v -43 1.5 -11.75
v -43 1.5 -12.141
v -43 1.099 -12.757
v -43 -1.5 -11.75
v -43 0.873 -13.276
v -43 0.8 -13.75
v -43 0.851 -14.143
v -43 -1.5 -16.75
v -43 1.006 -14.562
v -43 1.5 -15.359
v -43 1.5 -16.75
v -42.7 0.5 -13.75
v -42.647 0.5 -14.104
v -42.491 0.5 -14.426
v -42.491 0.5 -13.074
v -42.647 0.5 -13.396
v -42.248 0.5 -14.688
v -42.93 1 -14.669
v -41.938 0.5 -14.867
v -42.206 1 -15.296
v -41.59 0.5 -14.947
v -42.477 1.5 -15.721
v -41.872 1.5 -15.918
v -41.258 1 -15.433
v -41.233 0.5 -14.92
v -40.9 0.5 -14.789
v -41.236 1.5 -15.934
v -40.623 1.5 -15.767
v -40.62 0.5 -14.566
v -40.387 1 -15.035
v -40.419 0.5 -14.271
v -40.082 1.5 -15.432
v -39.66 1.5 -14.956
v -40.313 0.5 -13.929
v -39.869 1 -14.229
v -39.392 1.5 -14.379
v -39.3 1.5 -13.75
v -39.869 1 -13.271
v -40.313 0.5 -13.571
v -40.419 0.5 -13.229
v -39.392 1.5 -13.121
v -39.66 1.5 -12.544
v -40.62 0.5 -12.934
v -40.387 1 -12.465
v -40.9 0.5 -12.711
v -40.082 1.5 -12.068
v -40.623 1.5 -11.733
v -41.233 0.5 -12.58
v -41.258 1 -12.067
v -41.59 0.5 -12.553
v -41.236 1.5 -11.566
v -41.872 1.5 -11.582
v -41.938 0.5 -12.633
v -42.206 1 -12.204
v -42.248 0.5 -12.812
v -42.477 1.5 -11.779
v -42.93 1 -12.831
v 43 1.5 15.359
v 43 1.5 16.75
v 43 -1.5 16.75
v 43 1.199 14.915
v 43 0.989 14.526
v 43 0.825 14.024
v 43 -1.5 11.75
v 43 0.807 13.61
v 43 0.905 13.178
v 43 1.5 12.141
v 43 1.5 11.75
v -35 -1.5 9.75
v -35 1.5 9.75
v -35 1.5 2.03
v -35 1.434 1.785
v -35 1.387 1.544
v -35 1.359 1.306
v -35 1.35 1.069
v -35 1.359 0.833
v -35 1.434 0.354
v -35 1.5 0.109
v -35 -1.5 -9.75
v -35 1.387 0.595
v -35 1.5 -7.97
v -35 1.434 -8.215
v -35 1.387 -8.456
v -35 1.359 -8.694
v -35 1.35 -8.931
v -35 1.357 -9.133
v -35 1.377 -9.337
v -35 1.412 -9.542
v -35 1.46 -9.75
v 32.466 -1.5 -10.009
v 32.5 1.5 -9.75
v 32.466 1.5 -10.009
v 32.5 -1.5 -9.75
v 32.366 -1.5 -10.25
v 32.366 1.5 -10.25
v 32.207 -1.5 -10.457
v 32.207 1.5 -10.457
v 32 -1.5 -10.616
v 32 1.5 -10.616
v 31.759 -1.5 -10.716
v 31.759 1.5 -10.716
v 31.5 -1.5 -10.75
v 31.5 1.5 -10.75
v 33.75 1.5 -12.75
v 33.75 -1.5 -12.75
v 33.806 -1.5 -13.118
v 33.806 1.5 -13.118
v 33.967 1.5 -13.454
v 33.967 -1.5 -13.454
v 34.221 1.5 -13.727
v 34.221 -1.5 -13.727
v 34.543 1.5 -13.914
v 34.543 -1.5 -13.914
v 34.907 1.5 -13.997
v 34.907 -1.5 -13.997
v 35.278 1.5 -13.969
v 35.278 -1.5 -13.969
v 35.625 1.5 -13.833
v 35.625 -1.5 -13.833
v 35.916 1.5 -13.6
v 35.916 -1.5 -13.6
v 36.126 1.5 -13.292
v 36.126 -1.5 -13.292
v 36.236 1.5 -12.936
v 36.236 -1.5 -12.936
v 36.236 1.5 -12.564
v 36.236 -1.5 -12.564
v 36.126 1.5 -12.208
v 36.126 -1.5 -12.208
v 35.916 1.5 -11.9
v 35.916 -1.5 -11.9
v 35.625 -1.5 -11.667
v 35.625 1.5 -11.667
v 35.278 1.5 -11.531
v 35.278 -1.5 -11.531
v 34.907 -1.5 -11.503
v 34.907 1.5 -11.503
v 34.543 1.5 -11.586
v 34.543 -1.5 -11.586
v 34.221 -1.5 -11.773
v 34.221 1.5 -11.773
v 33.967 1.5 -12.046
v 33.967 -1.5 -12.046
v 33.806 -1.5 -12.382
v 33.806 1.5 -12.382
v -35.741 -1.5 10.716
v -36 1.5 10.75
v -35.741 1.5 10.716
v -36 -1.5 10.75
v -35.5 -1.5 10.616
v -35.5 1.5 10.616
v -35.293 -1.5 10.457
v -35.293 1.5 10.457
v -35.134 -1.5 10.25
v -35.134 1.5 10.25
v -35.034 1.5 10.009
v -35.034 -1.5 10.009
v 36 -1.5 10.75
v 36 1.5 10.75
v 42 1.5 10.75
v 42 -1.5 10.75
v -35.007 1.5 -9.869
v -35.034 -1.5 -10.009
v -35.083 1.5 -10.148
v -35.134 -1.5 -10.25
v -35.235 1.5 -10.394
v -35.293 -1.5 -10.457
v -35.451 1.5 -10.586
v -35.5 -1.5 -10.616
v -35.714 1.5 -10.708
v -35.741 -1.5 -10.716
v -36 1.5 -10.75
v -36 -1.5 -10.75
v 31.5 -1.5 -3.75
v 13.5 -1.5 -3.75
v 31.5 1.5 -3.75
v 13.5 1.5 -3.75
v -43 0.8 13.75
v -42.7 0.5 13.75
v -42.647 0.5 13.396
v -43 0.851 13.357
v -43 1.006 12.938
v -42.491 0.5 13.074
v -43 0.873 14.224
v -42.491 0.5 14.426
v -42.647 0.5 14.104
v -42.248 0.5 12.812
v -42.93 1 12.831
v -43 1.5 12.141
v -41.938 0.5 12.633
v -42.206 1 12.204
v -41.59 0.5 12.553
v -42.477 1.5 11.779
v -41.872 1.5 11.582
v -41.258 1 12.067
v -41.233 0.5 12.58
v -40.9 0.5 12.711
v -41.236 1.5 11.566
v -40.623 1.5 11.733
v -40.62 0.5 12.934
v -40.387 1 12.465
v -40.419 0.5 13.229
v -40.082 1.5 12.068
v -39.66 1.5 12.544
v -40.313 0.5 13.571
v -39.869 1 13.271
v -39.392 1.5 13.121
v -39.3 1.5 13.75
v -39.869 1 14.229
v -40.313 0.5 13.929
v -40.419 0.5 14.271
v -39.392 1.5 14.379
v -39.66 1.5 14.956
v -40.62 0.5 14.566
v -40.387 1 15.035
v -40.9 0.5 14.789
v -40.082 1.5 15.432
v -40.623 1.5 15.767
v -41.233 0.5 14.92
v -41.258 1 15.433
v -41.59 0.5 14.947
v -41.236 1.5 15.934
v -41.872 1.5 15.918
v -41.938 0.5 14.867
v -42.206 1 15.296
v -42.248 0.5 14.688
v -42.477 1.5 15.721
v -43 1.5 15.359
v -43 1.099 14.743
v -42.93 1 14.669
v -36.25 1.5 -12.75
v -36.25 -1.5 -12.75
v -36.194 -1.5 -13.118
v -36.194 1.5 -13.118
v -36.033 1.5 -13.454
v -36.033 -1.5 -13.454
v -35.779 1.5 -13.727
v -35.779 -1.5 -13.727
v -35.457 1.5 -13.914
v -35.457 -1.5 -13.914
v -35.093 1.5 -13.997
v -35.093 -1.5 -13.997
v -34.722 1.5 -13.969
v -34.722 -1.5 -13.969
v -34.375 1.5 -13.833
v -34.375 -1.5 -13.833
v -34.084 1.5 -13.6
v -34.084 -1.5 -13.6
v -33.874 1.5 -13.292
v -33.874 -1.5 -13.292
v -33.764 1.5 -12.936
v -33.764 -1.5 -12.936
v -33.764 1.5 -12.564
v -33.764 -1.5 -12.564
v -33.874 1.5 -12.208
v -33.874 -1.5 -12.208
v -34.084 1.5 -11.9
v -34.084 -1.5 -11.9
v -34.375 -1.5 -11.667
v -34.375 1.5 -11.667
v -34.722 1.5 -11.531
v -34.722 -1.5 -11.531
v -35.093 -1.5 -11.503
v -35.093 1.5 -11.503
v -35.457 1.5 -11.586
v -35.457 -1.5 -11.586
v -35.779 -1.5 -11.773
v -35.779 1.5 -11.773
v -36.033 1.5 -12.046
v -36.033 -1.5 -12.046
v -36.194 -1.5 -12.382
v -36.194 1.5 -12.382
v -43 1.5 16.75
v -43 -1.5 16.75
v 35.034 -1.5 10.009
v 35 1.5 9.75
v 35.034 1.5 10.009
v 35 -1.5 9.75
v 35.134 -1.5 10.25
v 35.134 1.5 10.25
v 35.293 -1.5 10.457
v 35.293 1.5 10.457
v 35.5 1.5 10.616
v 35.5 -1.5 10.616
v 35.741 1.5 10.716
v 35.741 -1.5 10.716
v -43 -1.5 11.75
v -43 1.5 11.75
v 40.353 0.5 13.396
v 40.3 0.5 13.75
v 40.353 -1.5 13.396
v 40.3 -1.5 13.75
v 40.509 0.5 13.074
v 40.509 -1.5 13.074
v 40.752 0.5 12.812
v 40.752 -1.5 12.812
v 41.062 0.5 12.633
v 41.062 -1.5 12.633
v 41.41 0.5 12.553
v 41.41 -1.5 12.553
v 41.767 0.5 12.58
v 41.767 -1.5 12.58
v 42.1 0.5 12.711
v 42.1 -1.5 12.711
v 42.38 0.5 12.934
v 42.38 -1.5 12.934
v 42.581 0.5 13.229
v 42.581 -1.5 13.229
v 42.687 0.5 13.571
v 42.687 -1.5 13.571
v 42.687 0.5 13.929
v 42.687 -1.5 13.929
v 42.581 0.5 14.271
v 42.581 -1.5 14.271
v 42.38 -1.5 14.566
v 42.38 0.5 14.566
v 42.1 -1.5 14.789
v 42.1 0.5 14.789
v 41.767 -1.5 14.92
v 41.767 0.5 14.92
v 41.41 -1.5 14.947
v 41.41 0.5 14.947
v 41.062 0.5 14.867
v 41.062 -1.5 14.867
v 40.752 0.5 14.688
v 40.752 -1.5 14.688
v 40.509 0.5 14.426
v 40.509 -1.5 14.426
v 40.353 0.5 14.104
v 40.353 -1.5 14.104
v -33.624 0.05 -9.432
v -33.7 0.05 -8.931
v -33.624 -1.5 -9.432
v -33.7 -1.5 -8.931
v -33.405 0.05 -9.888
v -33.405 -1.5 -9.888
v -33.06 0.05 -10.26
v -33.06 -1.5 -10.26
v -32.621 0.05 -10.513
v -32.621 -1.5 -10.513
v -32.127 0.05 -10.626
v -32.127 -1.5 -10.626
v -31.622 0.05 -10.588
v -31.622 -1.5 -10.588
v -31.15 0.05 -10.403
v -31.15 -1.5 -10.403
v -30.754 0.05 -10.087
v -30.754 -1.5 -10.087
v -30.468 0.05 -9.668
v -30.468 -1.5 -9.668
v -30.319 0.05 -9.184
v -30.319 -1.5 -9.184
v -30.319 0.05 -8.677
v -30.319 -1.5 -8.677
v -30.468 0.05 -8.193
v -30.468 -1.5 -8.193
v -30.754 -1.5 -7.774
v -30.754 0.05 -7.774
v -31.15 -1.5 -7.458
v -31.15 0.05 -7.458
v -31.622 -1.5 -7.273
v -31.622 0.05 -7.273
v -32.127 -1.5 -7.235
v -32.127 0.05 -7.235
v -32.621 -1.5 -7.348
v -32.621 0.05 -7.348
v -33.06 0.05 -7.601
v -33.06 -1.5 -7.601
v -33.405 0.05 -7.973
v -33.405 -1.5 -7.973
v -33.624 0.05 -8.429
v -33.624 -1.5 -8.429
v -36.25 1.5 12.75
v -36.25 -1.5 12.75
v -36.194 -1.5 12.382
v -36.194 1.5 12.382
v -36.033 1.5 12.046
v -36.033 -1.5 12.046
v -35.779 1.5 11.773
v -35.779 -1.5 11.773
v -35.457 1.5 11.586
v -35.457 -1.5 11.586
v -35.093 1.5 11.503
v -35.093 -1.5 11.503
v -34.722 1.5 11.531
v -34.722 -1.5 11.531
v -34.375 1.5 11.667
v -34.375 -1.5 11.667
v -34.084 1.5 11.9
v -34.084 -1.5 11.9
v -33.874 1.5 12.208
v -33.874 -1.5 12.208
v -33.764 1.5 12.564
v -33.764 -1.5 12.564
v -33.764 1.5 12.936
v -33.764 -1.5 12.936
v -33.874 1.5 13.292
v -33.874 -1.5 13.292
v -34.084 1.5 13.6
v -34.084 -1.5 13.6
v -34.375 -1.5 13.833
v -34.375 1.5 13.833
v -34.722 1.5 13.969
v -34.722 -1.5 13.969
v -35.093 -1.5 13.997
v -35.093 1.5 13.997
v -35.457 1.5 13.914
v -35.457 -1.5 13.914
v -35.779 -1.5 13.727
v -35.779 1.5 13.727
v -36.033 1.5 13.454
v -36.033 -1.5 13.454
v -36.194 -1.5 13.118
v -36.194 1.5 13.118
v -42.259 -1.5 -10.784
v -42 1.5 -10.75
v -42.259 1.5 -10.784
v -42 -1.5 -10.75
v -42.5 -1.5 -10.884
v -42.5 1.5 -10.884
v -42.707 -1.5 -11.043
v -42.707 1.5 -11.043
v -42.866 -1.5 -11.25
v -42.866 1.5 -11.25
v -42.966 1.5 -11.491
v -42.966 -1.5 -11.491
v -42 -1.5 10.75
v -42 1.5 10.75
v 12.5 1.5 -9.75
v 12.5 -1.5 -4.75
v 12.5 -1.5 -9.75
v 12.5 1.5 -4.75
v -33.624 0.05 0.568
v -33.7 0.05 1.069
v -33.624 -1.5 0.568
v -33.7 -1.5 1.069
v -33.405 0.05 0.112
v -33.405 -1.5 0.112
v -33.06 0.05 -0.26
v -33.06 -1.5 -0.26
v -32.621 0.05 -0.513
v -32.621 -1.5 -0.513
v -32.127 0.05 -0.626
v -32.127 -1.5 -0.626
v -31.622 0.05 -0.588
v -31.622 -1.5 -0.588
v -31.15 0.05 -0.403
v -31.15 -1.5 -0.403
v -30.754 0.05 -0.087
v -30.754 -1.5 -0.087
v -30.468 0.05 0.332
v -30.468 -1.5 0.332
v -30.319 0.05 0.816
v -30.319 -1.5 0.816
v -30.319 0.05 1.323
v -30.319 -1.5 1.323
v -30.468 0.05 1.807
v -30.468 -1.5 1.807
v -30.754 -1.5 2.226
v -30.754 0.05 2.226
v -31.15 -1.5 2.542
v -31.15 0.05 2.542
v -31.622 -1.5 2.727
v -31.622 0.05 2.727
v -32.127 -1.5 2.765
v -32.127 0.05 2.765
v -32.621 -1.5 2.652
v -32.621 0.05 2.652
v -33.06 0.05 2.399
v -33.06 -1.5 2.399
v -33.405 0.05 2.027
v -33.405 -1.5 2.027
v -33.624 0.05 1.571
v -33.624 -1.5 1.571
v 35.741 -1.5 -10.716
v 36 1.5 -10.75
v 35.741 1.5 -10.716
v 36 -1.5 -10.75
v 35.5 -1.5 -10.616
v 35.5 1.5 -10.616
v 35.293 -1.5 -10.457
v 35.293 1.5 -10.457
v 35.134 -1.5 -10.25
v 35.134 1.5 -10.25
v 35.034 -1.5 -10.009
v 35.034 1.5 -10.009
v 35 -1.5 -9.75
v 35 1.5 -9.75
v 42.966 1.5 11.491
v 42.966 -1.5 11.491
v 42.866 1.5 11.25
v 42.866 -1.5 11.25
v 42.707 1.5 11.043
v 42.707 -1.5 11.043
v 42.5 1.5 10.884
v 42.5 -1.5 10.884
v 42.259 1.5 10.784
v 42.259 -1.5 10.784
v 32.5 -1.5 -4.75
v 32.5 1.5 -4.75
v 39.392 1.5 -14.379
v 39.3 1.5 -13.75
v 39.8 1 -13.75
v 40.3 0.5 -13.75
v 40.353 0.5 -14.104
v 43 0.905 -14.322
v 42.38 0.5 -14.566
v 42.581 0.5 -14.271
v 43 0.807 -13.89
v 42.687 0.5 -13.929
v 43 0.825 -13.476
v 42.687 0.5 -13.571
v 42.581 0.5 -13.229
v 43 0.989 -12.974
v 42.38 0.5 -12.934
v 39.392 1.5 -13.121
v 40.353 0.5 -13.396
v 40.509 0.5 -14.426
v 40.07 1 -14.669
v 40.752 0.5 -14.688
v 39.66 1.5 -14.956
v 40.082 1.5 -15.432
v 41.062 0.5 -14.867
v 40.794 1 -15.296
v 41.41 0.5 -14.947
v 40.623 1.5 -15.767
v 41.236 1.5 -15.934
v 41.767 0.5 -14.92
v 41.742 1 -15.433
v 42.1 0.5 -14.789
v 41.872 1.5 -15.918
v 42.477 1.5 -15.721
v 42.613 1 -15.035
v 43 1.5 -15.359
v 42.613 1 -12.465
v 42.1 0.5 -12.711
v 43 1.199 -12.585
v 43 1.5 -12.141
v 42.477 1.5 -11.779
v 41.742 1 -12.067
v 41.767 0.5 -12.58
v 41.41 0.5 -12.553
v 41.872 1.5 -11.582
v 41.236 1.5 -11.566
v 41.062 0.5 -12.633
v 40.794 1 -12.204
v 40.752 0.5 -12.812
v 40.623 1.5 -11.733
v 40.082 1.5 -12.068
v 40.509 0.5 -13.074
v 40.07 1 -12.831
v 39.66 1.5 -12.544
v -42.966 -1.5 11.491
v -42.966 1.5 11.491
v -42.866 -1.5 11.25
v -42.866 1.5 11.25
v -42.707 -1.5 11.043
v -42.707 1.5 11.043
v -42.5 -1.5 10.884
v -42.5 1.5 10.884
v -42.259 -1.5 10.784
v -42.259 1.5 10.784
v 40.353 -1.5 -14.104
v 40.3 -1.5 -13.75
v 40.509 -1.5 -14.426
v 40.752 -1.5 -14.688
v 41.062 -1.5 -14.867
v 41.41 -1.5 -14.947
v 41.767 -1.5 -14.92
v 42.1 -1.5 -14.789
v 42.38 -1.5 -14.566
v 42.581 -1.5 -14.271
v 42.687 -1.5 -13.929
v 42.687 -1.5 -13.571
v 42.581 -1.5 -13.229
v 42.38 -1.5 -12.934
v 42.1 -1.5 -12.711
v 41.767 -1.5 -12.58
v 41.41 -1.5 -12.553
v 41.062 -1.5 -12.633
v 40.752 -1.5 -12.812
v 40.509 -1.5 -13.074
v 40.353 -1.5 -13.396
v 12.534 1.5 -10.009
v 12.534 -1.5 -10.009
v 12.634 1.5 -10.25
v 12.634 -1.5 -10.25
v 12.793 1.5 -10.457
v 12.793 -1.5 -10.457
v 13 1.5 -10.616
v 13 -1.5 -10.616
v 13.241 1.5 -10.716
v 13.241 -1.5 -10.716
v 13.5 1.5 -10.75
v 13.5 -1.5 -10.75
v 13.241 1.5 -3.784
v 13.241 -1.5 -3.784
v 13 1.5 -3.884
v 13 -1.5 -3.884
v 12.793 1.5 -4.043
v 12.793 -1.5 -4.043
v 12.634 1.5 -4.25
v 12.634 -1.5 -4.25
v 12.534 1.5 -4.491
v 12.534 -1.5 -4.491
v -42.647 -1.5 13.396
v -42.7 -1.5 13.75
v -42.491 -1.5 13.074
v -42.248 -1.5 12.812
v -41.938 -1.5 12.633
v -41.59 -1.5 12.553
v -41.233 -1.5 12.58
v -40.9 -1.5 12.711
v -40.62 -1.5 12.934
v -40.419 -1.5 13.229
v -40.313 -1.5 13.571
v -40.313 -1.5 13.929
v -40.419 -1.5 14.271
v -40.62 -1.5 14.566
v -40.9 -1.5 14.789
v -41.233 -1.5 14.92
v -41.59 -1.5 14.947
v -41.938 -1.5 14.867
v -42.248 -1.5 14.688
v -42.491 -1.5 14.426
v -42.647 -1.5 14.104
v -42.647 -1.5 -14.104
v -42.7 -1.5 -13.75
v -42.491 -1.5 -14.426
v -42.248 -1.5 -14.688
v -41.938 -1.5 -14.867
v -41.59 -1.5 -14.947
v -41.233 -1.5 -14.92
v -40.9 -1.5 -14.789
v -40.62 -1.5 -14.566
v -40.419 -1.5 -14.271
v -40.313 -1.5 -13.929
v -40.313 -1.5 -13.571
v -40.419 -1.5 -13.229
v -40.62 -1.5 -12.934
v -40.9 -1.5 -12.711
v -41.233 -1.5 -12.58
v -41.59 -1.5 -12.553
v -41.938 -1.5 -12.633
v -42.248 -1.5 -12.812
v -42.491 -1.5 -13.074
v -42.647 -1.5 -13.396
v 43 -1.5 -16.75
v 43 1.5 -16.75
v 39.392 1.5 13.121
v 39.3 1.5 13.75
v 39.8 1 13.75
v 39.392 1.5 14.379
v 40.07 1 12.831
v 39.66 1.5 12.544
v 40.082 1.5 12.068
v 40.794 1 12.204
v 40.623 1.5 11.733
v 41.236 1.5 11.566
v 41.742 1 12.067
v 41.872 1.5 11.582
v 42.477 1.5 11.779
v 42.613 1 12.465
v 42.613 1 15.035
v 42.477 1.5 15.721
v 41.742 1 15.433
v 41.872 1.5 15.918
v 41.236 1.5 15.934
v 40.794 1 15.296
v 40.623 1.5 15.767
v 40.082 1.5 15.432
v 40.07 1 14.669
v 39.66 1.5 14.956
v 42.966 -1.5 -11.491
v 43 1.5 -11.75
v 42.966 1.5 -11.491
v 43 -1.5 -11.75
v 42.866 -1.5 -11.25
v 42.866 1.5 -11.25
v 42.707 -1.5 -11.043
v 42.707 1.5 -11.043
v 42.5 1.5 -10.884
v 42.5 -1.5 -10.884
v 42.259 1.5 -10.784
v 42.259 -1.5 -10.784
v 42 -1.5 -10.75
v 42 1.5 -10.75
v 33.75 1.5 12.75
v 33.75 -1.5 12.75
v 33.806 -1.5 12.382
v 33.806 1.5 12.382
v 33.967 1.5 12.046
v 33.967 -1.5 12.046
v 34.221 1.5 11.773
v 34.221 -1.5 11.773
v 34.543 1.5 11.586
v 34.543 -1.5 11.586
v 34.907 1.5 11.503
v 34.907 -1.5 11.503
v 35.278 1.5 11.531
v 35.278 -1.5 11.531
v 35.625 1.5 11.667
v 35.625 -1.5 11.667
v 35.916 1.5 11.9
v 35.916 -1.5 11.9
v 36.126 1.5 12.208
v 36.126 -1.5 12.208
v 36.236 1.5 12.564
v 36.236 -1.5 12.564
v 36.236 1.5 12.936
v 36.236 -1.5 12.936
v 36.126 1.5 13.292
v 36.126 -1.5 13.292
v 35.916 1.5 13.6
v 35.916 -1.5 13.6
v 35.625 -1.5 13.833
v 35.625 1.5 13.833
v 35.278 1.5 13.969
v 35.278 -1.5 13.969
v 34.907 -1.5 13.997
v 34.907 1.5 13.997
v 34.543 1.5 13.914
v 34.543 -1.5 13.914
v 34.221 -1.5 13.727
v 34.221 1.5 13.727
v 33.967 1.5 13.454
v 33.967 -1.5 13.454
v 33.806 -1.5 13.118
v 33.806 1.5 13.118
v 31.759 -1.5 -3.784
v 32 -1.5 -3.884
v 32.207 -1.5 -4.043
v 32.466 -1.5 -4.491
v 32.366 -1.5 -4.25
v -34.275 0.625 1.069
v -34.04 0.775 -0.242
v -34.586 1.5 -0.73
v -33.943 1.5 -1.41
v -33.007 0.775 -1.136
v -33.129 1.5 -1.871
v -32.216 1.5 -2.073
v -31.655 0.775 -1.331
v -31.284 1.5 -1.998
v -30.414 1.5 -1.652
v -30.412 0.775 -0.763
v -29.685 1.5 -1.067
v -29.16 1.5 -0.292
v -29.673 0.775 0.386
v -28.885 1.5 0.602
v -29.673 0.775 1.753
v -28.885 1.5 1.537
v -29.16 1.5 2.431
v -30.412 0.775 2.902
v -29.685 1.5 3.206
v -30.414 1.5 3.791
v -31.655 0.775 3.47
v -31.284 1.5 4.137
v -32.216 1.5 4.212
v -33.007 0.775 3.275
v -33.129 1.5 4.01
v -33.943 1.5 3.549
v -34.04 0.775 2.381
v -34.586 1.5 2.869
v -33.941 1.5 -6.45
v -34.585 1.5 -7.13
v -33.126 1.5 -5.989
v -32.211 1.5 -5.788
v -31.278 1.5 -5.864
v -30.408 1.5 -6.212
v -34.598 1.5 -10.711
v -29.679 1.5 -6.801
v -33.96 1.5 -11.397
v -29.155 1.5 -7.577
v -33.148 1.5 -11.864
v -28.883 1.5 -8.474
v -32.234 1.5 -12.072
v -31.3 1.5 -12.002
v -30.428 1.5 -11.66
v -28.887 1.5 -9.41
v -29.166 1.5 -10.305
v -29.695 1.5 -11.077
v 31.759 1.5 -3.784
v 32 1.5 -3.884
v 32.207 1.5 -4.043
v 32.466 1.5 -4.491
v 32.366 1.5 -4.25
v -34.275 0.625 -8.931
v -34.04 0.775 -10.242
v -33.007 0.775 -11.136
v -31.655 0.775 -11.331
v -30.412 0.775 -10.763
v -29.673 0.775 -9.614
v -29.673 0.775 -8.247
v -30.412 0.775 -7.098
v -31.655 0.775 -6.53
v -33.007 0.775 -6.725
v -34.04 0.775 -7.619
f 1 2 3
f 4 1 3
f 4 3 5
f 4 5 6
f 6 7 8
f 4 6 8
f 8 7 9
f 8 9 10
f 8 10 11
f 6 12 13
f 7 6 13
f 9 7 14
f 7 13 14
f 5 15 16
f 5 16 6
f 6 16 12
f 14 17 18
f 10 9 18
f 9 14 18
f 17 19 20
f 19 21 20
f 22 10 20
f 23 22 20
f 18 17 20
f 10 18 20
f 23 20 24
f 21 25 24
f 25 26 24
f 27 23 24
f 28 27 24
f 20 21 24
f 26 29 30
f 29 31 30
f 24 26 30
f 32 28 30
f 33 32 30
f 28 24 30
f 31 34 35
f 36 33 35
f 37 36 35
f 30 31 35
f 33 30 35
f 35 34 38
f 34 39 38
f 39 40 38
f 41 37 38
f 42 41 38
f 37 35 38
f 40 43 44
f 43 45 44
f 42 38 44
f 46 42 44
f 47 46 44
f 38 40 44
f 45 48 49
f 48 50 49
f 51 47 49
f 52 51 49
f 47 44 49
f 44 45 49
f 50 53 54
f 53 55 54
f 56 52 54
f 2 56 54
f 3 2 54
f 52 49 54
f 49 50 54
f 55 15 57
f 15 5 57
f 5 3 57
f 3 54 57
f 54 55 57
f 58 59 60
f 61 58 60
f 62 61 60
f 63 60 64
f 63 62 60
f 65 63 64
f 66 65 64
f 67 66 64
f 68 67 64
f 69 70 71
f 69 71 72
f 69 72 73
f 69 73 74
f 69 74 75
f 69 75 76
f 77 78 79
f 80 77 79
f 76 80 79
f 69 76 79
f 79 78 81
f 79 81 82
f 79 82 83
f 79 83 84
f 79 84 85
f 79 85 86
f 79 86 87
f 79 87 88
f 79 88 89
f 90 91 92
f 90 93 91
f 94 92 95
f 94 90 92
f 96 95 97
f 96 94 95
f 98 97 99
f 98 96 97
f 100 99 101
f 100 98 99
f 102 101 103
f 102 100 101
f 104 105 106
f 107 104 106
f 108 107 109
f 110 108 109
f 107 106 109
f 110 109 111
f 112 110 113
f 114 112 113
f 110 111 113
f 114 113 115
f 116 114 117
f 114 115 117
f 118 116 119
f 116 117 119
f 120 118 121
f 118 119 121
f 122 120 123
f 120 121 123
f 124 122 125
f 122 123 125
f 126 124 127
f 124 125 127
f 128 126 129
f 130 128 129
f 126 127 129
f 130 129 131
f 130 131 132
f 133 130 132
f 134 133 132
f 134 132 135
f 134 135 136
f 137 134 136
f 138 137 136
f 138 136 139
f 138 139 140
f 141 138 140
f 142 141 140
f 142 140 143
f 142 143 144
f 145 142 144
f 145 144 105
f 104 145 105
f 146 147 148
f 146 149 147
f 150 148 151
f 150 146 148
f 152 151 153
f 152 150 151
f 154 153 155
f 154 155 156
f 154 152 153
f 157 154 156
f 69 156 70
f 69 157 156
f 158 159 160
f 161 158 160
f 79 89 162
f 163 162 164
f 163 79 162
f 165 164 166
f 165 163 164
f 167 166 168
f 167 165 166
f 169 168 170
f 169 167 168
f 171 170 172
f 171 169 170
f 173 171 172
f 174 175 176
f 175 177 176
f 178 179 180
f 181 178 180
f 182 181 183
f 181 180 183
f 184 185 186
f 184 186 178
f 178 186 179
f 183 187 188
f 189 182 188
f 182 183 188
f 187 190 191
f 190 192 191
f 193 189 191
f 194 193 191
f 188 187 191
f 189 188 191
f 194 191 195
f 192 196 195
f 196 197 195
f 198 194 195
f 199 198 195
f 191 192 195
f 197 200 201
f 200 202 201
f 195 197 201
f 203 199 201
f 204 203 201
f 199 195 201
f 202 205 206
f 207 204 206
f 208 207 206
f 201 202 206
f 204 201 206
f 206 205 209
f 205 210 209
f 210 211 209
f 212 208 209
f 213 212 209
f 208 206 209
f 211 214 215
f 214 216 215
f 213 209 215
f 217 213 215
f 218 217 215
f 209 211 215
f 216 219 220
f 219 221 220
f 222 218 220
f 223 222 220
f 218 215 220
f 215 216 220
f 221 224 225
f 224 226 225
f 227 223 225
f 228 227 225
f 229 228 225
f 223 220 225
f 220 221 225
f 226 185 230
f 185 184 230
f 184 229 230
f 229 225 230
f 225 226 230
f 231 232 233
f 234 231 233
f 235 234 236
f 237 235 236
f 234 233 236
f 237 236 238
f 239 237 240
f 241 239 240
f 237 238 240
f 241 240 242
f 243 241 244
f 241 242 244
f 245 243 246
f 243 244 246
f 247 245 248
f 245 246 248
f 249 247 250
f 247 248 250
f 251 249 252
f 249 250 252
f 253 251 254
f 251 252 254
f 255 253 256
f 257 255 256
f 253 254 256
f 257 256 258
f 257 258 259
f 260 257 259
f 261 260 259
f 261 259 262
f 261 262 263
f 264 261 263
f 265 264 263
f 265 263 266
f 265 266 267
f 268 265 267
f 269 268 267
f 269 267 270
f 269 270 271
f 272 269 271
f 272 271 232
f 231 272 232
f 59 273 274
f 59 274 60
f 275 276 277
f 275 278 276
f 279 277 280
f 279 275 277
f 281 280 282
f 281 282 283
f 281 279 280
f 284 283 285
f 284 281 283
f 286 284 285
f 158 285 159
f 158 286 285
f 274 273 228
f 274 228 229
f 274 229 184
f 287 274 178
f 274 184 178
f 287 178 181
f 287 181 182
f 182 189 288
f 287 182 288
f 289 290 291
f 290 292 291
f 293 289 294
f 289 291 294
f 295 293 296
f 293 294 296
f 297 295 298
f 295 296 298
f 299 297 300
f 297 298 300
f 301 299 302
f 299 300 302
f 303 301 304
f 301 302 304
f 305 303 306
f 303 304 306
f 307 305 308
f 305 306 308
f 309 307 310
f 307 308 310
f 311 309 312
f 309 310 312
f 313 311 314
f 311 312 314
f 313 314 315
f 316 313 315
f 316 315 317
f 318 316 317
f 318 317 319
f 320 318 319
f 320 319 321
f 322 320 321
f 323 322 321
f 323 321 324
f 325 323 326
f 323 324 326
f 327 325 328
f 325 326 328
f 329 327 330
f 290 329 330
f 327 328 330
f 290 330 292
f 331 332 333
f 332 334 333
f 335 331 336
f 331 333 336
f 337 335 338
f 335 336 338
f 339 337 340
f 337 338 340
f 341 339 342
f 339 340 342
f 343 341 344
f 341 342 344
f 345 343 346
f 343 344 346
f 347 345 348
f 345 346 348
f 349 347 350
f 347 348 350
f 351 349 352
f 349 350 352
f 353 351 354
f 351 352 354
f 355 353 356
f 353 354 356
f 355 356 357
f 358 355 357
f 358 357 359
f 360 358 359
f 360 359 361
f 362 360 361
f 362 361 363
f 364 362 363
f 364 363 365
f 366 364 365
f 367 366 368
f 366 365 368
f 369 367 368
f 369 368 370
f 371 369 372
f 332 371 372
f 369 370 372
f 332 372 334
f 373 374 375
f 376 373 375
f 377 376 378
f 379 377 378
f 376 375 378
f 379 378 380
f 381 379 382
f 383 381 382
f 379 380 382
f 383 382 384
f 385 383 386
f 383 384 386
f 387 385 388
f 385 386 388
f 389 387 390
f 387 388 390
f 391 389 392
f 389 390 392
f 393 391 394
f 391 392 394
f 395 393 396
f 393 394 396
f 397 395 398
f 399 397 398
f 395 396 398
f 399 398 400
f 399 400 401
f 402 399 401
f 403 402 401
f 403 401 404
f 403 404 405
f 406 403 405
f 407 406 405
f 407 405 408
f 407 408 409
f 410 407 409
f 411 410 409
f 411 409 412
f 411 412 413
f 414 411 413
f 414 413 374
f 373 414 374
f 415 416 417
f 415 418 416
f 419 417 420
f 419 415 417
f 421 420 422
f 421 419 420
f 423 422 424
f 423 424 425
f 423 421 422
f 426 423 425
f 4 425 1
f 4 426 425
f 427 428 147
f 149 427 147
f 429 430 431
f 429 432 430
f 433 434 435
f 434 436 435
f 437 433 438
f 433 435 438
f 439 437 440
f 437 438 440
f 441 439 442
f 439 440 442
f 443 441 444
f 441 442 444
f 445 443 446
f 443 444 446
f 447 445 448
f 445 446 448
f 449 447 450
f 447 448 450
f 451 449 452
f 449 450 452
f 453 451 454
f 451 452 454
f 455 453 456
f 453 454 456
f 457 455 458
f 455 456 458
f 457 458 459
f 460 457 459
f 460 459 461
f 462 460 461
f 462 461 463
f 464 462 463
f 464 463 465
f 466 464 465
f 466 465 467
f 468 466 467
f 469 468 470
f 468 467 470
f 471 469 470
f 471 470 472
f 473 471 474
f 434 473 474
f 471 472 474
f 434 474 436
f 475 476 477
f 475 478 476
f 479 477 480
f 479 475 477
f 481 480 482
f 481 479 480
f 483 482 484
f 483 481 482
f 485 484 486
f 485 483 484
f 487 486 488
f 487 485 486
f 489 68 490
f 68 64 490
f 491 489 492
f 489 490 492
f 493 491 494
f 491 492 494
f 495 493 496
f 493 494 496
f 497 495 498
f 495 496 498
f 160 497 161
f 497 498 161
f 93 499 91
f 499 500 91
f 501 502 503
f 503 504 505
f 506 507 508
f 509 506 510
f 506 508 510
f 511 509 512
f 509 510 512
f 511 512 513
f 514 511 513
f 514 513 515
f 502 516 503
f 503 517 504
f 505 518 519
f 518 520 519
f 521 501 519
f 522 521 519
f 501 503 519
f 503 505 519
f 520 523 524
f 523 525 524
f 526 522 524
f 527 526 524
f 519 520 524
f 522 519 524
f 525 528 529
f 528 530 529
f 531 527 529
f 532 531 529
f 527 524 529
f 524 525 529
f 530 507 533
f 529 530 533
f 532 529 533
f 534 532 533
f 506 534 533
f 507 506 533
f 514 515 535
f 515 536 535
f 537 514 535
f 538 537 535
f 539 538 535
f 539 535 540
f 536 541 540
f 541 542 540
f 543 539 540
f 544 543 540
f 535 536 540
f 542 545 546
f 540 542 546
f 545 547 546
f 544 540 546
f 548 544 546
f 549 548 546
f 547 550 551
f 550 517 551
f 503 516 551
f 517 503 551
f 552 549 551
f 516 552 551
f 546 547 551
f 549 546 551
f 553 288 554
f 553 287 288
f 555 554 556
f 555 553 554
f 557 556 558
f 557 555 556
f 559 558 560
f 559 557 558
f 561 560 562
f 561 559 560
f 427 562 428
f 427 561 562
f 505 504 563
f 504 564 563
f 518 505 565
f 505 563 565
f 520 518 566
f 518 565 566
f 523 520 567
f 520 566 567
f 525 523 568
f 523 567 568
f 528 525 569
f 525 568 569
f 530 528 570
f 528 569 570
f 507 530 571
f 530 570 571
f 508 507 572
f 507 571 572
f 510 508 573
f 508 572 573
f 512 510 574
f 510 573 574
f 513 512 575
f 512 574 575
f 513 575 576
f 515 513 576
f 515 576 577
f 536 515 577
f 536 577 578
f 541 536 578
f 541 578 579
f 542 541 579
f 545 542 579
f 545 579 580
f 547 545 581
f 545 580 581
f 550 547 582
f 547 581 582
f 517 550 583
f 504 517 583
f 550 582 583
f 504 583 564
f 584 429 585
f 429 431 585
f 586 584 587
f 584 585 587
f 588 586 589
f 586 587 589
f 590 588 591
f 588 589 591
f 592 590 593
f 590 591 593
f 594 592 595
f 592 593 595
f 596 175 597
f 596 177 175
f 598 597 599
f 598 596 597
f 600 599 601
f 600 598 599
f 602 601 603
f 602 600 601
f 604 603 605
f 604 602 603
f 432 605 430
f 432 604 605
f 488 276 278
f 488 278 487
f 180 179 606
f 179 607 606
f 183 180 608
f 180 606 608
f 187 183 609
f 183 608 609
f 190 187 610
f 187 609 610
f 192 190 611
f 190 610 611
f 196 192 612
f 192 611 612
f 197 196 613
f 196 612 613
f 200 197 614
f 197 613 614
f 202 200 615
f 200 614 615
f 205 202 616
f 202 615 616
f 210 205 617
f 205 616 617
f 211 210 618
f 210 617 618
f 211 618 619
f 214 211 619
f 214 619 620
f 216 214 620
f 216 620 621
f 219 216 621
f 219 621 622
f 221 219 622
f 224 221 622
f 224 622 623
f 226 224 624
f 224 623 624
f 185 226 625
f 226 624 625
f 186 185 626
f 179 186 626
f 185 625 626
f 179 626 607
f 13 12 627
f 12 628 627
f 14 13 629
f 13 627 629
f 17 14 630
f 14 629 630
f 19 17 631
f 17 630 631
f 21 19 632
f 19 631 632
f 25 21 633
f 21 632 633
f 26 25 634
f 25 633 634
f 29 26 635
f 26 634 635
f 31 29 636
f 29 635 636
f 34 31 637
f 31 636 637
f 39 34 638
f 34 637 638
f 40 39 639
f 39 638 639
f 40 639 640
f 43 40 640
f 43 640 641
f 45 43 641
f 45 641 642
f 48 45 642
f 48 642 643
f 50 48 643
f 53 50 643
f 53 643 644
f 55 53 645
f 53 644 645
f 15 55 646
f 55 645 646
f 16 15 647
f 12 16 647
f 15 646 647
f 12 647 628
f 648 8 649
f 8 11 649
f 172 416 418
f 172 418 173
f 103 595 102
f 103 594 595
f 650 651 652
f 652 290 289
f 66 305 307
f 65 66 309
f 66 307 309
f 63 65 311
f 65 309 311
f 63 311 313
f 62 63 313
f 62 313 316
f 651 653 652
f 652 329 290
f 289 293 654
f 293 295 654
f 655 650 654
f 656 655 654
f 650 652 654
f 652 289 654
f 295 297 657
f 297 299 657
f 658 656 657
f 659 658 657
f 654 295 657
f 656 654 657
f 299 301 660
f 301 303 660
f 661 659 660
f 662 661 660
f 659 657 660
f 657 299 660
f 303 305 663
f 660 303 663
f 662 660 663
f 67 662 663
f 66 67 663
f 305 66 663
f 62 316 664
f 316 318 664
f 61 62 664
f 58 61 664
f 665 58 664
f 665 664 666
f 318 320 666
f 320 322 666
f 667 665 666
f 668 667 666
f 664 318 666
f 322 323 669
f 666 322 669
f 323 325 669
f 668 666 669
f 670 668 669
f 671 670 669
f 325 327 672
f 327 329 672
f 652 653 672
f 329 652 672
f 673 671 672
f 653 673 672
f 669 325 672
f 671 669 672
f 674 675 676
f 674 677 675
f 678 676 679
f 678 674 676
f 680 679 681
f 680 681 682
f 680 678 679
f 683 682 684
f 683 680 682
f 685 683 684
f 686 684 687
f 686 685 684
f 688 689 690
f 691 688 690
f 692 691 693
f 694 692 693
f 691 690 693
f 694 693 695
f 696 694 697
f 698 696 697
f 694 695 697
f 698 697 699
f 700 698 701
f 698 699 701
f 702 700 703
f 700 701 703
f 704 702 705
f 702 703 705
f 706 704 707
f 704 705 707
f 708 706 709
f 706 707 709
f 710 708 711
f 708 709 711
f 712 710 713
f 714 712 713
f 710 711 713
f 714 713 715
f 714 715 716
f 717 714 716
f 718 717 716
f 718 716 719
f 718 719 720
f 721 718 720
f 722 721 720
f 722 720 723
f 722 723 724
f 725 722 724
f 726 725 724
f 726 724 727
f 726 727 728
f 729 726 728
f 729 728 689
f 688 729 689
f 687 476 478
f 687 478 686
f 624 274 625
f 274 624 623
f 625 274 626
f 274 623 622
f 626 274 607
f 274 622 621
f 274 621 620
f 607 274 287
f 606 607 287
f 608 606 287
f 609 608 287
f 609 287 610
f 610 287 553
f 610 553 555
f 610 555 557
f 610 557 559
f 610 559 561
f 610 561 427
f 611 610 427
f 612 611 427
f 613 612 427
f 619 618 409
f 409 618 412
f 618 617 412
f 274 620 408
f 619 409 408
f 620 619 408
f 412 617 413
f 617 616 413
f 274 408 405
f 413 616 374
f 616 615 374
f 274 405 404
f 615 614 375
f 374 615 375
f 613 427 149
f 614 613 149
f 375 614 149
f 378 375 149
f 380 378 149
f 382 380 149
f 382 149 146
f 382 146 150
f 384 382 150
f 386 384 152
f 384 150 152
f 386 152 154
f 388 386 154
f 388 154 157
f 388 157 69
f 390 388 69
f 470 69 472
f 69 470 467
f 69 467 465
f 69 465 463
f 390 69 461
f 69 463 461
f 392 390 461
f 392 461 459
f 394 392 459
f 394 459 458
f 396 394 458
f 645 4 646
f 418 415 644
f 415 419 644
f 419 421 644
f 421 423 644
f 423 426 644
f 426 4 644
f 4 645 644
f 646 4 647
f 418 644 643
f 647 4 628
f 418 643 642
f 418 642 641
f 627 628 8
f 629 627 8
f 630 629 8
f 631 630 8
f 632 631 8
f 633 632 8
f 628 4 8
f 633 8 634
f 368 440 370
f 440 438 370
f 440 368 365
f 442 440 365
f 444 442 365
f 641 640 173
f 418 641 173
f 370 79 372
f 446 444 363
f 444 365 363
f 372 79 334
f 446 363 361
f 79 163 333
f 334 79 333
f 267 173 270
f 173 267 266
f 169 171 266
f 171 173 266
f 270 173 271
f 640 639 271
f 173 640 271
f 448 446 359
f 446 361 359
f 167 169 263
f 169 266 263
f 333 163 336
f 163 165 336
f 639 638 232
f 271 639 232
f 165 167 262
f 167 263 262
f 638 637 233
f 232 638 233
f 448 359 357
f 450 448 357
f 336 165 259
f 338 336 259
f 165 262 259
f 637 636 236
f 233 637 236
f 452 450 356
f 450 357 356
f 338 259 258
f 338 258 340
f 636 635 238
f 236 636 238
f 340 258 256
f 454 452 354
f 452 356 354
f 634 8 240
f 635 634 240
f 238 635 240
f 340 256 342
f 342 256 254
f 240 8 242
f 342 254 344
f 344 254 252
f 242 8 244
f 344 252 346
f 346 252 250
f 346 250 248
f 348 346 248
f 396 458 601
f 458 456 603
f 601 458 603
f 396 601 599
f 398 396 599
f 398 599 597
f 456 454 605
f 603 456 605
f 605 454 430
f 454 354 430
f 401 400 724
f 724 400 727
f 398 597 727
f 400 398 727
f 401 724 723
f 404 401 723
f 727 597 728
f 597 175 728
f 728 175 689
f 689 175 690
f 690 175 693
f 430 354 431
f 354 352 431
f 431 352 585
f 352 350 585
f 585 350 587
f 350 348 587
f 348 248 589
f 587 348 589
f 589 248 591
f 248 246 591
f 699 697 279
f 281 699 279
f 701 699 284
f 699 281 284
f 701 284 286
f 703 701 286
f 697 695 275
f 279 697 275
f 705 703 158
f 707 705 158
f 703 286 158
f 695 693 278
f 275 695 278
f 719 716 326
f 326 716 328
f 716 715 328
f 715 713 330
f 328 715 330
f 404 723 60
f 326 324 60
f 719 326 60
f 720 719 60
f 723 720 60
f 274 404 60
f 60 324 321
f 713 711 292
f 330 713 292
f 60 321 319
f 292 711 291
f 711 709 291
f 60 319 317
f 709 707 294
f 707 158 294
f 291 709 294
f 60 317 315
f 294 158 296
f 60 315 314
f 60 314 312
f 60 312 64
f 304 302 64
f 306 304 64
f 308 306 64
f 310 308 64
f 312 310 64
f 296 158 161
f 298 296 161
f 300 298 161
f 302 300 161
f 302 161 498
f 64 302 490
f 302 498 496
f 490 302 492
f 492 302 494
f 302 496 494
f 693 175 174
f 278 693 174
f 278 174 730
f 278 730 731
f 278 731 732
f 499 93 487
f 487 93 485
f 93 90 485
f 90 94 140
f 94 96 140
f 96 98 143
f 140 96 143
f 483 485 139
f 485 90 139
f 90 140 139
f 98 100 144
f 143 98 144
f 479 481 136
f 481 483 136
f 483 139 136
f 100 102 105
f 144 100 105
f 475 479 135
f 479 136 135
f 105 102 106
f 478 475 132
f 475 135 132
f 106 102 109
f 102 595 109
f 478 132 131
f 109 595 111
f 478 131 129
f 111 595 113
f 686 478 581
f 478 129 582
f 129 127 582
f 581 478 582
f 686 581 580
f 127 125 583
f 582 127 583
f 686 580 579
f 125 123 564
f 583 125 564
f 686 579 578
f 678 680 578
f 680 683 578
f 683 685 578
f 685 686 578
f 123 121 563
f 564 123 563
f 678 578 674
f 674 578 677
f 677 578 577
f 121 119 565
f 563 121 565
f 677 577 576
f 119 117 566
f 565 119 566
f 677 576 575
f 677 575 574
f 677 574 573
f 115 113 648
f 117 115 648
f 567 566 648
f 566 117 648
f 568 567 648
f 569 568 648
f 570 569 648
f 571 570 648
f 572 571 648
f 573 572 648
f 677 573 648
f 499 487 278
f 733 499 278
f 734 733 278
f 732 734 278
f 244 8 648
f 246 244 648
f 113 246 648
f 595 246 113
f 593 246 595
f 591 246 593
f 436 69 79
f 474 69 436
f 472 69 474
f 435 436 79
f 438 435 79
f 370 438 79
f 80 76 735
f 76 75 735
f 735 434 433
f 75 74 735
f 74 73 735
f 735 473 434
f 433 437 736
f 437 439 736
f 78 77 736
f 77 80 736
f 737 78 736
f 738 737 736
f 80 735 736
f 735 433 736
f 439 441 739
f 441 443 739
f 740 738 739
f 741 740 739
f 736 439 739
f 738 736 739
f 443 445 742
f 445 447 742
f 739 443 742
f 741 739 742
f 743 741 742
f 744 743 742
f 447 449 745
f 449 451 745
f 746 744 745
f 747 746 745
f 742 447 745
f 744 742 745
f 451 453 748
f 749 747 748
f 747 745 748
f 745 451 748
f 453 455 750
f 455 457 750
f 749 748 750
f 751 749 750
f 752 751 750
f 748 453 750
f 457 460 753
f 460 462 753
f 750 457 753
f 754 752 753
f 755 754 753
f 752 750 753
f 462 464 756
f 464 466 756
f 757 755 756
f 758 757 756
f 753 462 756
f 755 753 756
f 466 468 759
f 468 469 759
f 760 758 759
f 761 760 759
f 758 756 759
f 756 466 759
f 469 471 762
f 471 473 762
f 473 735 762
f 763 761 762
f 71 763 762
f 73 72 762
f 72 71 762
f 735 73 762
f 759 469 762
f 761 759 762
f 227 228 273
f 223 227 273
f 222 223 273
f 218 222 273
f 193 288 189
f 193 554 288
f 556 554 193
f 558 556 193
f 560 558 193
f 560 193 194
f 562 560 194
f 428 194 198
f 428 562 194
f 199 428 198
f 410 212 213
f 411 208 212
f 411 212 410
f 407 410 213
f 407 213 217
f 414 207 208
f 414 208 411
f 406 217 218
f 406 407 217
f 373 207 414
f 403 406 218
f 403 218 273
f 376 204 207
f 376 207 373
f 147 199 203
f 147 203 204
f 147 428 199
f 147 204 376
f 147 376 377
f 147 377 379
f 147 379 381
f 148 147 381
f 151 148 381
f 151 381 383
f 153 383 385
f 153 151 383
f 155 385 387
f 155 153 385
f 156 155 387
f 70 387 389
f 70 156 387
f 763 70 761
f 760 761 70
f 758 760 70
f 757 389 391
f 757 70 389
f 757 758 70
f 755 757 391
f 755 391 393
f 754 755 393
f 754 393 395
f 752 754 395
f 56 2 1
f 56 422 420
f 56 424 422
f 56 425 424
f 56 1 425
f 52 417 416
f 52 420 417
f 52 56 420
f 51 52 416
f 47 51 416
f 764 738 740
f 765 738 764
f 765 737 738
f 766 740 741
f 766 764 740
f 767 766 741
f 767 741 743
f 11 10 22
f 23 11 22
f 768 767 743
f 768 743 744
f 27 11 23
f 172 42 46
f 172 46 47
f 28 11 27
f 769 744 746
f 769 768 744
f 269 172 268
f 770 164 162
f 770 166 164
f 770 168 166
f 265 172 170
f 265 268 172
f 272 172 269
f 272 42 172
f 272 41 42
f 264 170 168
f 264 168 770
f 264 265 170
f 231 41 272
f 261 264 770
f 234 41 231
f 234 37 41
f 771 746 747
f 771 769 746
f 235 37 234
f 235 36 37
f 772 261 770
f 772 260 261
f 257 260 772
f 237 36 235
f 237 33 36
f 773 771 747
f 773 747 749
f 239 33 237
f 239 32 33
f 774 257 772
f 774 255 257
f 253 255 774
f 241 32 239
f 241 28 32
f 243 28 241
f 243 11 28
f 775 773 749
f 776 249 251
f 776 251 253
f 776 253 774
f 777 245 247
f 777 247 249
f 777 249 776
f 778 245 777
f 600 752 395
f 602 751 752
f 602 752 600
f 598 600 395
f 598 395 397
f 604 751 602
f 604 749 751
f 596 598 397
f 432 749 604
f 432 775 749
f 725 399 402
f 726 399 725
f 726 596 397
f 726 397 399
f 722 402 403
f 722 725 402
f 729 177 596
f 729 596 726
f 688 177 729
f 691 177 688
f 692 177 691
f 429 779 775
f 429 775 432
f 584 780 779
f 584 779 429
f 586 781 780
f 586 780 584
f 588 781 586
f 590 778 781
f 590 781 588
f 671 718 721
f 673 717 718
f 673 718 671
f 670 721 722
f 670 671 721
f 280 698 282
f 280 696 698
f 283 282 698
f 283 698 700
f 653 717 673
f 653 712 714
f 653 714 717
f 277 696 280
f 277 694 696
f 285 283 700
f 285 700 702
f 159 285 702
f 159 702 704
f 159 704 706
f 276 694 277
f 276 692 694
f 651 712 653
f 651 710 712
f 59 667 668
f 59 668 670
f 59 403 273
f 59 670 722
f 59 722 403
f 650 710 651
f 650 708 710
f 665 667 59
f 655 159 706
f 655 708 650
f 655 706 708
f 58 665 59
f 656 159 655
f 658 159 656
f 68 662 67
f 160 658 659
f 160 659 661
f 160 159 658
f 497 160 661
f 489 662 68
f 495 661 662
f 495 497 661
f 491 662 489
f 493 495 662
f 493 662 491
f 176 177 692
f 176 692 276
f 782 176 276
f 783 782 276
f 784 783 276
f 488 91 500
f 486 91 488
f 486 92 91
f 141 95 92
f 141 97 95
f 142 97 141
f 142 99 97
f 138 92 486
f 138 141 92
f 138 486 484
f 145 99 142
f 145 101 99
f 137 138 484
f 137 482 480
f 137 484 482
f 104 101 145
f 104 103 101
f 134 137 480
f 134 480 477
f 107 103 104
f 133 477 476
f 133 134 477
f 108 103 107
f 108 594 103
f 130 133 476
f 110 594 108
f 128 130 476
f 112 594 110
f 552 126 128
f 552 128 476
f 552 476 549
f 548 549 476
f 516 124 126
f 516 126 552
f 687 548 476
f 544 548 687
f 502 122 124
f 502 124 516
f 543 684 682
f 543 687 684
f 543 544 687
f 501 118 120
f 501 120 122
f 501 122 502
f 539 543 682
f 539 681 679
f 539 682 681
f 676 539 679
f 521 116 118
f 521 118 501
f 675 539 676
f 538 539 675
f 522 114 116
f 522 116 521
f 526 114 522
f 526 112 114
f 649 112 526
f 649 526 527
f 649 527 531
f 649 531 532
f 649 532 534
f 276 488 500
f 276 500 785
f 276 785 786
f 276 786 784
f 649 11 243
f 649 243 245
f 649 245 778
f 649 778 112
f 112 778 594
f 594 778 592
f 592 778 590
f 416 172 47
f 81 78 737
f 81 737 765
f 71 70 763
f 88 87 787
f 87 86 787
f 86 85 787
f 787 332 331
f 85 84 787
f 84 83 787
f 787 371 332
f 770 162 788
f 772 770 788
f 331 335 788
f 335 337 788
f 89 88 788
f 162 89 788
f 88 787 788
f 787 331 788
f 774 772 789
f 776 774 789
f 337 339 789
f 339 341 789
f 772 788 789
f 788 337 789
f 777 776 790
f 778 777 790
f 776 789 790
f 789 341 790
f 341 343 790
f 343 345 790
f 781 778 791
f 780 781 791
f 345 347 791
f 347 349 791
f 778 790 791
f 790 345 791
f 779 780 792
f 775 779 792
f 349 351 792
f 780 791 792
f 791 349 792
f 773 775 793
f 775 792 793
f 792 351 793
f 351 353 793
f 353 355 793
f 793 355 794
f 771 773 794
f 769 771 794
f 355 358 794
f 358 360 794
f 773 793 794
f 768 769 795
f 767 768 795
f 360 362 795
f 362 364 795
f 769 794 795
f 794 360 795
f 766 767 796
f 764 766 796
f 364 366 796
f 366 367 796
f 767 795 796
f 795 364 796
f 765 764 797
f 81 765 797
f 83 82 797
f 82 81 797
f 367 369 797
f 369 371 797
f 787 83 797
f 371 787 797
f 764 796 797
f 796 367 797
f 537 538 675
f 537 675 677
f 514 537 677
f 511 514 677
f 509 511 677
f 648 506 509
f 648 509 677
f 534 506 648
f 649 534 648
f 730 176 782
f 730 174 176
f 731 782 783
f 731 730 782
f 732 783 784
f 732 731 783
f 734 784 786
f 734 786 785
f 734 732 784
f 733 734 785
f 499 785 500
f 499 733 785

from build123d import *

# Parameters (mm, degrees)
SKETCH1_W                                           = 86
SKETCH1_H                                           = 33.5
SKETCH1_W_2                                         = 20
SKETCH1_H_2                                         = 7
BOSS_EXTRUDE1_DEPTH                                 = 1.5
CSK_FOR_M3_COUNTERSUNK_FLAT_HEAD_SCREW1_D           = 3.4
CSK_FOR_M3_COUNTERSUNK_FLAT_HEAD_SCREW1_DEPTH       = 6
CSK_FOR_M3_COUNTERSUNK_FLAT_HEAD_SCREW1_CSINK_D     = 6.3
CSK_FOR_M3_COUNTERSUNK_FLAT_HEAD_SCREW1_CSINK_ANGLE = 90
CSK_FOR_M3_COUNTERSUNK_FLAT_HEAD_SCREW1_TIP         = 1.021463052
TAP_DRILL_FOR_M3_TAP1_D                             = 2.5
SKETCH13_W                                          = 3.5
SKETCH13_H                                          = 18
CUT_EXTRUDE3_DEPTH                                  = 48.943325917
CSK_FOR_M2_COUNTERSUNK_FLAT_HEAD_SCREW3_D           = 2.4
CSK_FOR_M2_COUNTERSUNK_FLAT_HEAD_SCREW3_DEPTH       = 4
CSK_FOR_M2_COUNTERSUNK_FLAT_HEAD_SCREW3_CSINK_D     = 4.4
CSK_FOR_M2_COUNTERSUNK_FLAT_HEAD_SCREW3_CSINK_ANGLE = 90
CSK_FOR_M2_COUNTERSUNK_FLAT_HEAD_SCREW3_TIP         = 0.721032743
SKETCH21_W                                          = 8
SKETCH21_H                                          = 21.5
CUT_EXTRUDE4_DEPTH                                  = 47.244594279
FILLET2_R                                           = 1


with BuildPart() as part:
    # Sketch1 → Boss-Extrude1 (new, symmetric)
    with BuildSketch(Plane(origin=(0, 0, 0), x_dir=(1, 0, 0), z_dir=(0, 1, 0))):
        Rectangle(SKETCH1_W, SKETCH1_H)
        with Locations((22.5, 7.25)):
            Rectangle(SKETCH1_W_2, SKETCH1_H_2, mode=Mode.SUBTRACT)
    extrude(amount=BOSS_EXTRUDE1_DEPTH, both=True)

    # CSK for M3 Countersunk Flat Head Screw1
    with Locations(Plane(origin=(0, 1.5, 0), x_dir=(1, 0, 0), z_dir=(0, 1, 0))):
        with Locations((-32, 8.93052757), (-32, -1.06947243)):
            CounterSinkHole(CSK_FOR_M3_COUNTERSUNK_FLAT_HEAD_SCREW1_D / 2, CSK_FOR_M3_COUNTERSUNK_FLAT_HEAD_SCREW1_CSINK_D / 2, depth=CSK_FOR_M3_COUNTERSUNK_FLAT_HEAD_SCREW1_DEPTH, counter_sink_angle=CSK_FOR_M3_COUNTERSUNK_FLAT_HEAD_SCREW1_CSINK_ANGLE)
            with Locations((0, 0, -(CSK_FOR_M3_COUNTERSUNK_FLAT_HEAD_SCREW1_DEPTH + CSK_FOR_M3_COUNTERSUNK_FLAT_HEAD_SCREW1_TIP / 2))):  # 118° drill point
                Cone(0, CSK_FOR_M3_COUNTERSUNK_FLAT_HEAD_SCREW1_D / 2, CSK_FOR_M3_COUNTERSUNK_FLAT_HEAD_SCREW1_TIP, mode=Mode.SUBTRACT)

    # Tap Drill for M3 Tap1 (through all)
    with Locations(Plane(origin=(0, 1.5, 0), x_dir=(1, 0, 0), z_dir=(0, 1, 0))):
        with Locations((-35, 12.75), (-35, -12.75), (35, -12.75), (35, 12.75)):
            Hole(TAP_DRILL_FOR_M3_TAP1_D / 2)

    # Sketch13 → Cut-Extrude3 (cut, through all)
    with BuildSketch(Plane.XZ.offset(11.5)):
        with Locations((-38.25, -0.25)):
            Rectangle(SKETCH13_W, SKETCH13_H)
    extrude(amount=-CUT_EXTRUDE3_DEPTH, mode=Mode.SUBTRACT)

    # CSK for M2 Countersunk Flat Head Screw3
    with Locations(Plane(origin=(0, 1.5, 0), x_dir=(1, 0, 0), z_dir=(0, 1, 0))):
        with Locations((-41.5, -13.75), (-41.5, 13.75), (41.5, 13.75), (41.5, -13.75)):
            CounterSinkHole(CSK_FOR_M2_COUNTERSUNK_FLAT_HEAD_SCREW3_D / 2, CSK_FOR_M2_COUNTERSUNK_FLAT_HEAD_SCREW3_CSINK_D / 2, depth=CSK_FOR_M2_COUNTERSUNK_FLAT_HEAD_SCREW3_DEPTH, counter_sink_angle=CSK_FOR_M2_COUNTERSUNK_FLAT_HEAD_SCREW3_CSINK_ANGLE)
            with Locations((0, 0, -(CSK_FOR_M2_COUNTERSUNK_FLAT_HEAD_SCREW3_DEPTH + CSK_FOR_M2_COUNTERSUNK_FLAT_HEAD_SCREW3_TIP / 2))):  # 118° drill point
                Cone(0, CSK_FOR_M2_COUNTERSUNK_FLAT_HEAD_SCREW3_D / 2, CSK_FOR_M2_COUNTERSUNK_FLAT_HEAD_SCREW3_TIP, mode=Mode.SUBTRACT)

    # Sketch21 → Cut-Extrude4 (cut, through all)
    with BuildSketch(Plane(origin=(0, 1.5, 0), x_dir=(1, 0, 0), z_dir=(0, 1, 0))):
        with Locations((-39, 0)):
            Rectangle(SKETCH21_W, SKETCH21_H)
        with Locations((39, 0)):
            Rectangle(SKETCH21_W, SKETCH21_H)
    extrude(amount=-CUT_EXTRUDE4_DEPTH, mode=Mode.SUBTRACT)

    # Fillet2
    fillet2_edges = [part.edges().sort_by_distance(p)[0] for p in [
        (35, 0, 10.75),
        (43, 0, 10.75),
        (43, 0, -10.75),
        (35, 0, -10.75),
        (-43, 0, 10.75),
        (-35, 0, 10.75),
        (-43, 0, -10.75),
        (-35, 0, -10.75),
        (12.5, 0, -3.75),
        (32.5, 0, -3.75),
        (32.5, 0, -10.75),
        (12.5, 0, -10.75),
    ]]
    fillet(fillet2_edges, radius=FILLET2_R)


solid = part.part
